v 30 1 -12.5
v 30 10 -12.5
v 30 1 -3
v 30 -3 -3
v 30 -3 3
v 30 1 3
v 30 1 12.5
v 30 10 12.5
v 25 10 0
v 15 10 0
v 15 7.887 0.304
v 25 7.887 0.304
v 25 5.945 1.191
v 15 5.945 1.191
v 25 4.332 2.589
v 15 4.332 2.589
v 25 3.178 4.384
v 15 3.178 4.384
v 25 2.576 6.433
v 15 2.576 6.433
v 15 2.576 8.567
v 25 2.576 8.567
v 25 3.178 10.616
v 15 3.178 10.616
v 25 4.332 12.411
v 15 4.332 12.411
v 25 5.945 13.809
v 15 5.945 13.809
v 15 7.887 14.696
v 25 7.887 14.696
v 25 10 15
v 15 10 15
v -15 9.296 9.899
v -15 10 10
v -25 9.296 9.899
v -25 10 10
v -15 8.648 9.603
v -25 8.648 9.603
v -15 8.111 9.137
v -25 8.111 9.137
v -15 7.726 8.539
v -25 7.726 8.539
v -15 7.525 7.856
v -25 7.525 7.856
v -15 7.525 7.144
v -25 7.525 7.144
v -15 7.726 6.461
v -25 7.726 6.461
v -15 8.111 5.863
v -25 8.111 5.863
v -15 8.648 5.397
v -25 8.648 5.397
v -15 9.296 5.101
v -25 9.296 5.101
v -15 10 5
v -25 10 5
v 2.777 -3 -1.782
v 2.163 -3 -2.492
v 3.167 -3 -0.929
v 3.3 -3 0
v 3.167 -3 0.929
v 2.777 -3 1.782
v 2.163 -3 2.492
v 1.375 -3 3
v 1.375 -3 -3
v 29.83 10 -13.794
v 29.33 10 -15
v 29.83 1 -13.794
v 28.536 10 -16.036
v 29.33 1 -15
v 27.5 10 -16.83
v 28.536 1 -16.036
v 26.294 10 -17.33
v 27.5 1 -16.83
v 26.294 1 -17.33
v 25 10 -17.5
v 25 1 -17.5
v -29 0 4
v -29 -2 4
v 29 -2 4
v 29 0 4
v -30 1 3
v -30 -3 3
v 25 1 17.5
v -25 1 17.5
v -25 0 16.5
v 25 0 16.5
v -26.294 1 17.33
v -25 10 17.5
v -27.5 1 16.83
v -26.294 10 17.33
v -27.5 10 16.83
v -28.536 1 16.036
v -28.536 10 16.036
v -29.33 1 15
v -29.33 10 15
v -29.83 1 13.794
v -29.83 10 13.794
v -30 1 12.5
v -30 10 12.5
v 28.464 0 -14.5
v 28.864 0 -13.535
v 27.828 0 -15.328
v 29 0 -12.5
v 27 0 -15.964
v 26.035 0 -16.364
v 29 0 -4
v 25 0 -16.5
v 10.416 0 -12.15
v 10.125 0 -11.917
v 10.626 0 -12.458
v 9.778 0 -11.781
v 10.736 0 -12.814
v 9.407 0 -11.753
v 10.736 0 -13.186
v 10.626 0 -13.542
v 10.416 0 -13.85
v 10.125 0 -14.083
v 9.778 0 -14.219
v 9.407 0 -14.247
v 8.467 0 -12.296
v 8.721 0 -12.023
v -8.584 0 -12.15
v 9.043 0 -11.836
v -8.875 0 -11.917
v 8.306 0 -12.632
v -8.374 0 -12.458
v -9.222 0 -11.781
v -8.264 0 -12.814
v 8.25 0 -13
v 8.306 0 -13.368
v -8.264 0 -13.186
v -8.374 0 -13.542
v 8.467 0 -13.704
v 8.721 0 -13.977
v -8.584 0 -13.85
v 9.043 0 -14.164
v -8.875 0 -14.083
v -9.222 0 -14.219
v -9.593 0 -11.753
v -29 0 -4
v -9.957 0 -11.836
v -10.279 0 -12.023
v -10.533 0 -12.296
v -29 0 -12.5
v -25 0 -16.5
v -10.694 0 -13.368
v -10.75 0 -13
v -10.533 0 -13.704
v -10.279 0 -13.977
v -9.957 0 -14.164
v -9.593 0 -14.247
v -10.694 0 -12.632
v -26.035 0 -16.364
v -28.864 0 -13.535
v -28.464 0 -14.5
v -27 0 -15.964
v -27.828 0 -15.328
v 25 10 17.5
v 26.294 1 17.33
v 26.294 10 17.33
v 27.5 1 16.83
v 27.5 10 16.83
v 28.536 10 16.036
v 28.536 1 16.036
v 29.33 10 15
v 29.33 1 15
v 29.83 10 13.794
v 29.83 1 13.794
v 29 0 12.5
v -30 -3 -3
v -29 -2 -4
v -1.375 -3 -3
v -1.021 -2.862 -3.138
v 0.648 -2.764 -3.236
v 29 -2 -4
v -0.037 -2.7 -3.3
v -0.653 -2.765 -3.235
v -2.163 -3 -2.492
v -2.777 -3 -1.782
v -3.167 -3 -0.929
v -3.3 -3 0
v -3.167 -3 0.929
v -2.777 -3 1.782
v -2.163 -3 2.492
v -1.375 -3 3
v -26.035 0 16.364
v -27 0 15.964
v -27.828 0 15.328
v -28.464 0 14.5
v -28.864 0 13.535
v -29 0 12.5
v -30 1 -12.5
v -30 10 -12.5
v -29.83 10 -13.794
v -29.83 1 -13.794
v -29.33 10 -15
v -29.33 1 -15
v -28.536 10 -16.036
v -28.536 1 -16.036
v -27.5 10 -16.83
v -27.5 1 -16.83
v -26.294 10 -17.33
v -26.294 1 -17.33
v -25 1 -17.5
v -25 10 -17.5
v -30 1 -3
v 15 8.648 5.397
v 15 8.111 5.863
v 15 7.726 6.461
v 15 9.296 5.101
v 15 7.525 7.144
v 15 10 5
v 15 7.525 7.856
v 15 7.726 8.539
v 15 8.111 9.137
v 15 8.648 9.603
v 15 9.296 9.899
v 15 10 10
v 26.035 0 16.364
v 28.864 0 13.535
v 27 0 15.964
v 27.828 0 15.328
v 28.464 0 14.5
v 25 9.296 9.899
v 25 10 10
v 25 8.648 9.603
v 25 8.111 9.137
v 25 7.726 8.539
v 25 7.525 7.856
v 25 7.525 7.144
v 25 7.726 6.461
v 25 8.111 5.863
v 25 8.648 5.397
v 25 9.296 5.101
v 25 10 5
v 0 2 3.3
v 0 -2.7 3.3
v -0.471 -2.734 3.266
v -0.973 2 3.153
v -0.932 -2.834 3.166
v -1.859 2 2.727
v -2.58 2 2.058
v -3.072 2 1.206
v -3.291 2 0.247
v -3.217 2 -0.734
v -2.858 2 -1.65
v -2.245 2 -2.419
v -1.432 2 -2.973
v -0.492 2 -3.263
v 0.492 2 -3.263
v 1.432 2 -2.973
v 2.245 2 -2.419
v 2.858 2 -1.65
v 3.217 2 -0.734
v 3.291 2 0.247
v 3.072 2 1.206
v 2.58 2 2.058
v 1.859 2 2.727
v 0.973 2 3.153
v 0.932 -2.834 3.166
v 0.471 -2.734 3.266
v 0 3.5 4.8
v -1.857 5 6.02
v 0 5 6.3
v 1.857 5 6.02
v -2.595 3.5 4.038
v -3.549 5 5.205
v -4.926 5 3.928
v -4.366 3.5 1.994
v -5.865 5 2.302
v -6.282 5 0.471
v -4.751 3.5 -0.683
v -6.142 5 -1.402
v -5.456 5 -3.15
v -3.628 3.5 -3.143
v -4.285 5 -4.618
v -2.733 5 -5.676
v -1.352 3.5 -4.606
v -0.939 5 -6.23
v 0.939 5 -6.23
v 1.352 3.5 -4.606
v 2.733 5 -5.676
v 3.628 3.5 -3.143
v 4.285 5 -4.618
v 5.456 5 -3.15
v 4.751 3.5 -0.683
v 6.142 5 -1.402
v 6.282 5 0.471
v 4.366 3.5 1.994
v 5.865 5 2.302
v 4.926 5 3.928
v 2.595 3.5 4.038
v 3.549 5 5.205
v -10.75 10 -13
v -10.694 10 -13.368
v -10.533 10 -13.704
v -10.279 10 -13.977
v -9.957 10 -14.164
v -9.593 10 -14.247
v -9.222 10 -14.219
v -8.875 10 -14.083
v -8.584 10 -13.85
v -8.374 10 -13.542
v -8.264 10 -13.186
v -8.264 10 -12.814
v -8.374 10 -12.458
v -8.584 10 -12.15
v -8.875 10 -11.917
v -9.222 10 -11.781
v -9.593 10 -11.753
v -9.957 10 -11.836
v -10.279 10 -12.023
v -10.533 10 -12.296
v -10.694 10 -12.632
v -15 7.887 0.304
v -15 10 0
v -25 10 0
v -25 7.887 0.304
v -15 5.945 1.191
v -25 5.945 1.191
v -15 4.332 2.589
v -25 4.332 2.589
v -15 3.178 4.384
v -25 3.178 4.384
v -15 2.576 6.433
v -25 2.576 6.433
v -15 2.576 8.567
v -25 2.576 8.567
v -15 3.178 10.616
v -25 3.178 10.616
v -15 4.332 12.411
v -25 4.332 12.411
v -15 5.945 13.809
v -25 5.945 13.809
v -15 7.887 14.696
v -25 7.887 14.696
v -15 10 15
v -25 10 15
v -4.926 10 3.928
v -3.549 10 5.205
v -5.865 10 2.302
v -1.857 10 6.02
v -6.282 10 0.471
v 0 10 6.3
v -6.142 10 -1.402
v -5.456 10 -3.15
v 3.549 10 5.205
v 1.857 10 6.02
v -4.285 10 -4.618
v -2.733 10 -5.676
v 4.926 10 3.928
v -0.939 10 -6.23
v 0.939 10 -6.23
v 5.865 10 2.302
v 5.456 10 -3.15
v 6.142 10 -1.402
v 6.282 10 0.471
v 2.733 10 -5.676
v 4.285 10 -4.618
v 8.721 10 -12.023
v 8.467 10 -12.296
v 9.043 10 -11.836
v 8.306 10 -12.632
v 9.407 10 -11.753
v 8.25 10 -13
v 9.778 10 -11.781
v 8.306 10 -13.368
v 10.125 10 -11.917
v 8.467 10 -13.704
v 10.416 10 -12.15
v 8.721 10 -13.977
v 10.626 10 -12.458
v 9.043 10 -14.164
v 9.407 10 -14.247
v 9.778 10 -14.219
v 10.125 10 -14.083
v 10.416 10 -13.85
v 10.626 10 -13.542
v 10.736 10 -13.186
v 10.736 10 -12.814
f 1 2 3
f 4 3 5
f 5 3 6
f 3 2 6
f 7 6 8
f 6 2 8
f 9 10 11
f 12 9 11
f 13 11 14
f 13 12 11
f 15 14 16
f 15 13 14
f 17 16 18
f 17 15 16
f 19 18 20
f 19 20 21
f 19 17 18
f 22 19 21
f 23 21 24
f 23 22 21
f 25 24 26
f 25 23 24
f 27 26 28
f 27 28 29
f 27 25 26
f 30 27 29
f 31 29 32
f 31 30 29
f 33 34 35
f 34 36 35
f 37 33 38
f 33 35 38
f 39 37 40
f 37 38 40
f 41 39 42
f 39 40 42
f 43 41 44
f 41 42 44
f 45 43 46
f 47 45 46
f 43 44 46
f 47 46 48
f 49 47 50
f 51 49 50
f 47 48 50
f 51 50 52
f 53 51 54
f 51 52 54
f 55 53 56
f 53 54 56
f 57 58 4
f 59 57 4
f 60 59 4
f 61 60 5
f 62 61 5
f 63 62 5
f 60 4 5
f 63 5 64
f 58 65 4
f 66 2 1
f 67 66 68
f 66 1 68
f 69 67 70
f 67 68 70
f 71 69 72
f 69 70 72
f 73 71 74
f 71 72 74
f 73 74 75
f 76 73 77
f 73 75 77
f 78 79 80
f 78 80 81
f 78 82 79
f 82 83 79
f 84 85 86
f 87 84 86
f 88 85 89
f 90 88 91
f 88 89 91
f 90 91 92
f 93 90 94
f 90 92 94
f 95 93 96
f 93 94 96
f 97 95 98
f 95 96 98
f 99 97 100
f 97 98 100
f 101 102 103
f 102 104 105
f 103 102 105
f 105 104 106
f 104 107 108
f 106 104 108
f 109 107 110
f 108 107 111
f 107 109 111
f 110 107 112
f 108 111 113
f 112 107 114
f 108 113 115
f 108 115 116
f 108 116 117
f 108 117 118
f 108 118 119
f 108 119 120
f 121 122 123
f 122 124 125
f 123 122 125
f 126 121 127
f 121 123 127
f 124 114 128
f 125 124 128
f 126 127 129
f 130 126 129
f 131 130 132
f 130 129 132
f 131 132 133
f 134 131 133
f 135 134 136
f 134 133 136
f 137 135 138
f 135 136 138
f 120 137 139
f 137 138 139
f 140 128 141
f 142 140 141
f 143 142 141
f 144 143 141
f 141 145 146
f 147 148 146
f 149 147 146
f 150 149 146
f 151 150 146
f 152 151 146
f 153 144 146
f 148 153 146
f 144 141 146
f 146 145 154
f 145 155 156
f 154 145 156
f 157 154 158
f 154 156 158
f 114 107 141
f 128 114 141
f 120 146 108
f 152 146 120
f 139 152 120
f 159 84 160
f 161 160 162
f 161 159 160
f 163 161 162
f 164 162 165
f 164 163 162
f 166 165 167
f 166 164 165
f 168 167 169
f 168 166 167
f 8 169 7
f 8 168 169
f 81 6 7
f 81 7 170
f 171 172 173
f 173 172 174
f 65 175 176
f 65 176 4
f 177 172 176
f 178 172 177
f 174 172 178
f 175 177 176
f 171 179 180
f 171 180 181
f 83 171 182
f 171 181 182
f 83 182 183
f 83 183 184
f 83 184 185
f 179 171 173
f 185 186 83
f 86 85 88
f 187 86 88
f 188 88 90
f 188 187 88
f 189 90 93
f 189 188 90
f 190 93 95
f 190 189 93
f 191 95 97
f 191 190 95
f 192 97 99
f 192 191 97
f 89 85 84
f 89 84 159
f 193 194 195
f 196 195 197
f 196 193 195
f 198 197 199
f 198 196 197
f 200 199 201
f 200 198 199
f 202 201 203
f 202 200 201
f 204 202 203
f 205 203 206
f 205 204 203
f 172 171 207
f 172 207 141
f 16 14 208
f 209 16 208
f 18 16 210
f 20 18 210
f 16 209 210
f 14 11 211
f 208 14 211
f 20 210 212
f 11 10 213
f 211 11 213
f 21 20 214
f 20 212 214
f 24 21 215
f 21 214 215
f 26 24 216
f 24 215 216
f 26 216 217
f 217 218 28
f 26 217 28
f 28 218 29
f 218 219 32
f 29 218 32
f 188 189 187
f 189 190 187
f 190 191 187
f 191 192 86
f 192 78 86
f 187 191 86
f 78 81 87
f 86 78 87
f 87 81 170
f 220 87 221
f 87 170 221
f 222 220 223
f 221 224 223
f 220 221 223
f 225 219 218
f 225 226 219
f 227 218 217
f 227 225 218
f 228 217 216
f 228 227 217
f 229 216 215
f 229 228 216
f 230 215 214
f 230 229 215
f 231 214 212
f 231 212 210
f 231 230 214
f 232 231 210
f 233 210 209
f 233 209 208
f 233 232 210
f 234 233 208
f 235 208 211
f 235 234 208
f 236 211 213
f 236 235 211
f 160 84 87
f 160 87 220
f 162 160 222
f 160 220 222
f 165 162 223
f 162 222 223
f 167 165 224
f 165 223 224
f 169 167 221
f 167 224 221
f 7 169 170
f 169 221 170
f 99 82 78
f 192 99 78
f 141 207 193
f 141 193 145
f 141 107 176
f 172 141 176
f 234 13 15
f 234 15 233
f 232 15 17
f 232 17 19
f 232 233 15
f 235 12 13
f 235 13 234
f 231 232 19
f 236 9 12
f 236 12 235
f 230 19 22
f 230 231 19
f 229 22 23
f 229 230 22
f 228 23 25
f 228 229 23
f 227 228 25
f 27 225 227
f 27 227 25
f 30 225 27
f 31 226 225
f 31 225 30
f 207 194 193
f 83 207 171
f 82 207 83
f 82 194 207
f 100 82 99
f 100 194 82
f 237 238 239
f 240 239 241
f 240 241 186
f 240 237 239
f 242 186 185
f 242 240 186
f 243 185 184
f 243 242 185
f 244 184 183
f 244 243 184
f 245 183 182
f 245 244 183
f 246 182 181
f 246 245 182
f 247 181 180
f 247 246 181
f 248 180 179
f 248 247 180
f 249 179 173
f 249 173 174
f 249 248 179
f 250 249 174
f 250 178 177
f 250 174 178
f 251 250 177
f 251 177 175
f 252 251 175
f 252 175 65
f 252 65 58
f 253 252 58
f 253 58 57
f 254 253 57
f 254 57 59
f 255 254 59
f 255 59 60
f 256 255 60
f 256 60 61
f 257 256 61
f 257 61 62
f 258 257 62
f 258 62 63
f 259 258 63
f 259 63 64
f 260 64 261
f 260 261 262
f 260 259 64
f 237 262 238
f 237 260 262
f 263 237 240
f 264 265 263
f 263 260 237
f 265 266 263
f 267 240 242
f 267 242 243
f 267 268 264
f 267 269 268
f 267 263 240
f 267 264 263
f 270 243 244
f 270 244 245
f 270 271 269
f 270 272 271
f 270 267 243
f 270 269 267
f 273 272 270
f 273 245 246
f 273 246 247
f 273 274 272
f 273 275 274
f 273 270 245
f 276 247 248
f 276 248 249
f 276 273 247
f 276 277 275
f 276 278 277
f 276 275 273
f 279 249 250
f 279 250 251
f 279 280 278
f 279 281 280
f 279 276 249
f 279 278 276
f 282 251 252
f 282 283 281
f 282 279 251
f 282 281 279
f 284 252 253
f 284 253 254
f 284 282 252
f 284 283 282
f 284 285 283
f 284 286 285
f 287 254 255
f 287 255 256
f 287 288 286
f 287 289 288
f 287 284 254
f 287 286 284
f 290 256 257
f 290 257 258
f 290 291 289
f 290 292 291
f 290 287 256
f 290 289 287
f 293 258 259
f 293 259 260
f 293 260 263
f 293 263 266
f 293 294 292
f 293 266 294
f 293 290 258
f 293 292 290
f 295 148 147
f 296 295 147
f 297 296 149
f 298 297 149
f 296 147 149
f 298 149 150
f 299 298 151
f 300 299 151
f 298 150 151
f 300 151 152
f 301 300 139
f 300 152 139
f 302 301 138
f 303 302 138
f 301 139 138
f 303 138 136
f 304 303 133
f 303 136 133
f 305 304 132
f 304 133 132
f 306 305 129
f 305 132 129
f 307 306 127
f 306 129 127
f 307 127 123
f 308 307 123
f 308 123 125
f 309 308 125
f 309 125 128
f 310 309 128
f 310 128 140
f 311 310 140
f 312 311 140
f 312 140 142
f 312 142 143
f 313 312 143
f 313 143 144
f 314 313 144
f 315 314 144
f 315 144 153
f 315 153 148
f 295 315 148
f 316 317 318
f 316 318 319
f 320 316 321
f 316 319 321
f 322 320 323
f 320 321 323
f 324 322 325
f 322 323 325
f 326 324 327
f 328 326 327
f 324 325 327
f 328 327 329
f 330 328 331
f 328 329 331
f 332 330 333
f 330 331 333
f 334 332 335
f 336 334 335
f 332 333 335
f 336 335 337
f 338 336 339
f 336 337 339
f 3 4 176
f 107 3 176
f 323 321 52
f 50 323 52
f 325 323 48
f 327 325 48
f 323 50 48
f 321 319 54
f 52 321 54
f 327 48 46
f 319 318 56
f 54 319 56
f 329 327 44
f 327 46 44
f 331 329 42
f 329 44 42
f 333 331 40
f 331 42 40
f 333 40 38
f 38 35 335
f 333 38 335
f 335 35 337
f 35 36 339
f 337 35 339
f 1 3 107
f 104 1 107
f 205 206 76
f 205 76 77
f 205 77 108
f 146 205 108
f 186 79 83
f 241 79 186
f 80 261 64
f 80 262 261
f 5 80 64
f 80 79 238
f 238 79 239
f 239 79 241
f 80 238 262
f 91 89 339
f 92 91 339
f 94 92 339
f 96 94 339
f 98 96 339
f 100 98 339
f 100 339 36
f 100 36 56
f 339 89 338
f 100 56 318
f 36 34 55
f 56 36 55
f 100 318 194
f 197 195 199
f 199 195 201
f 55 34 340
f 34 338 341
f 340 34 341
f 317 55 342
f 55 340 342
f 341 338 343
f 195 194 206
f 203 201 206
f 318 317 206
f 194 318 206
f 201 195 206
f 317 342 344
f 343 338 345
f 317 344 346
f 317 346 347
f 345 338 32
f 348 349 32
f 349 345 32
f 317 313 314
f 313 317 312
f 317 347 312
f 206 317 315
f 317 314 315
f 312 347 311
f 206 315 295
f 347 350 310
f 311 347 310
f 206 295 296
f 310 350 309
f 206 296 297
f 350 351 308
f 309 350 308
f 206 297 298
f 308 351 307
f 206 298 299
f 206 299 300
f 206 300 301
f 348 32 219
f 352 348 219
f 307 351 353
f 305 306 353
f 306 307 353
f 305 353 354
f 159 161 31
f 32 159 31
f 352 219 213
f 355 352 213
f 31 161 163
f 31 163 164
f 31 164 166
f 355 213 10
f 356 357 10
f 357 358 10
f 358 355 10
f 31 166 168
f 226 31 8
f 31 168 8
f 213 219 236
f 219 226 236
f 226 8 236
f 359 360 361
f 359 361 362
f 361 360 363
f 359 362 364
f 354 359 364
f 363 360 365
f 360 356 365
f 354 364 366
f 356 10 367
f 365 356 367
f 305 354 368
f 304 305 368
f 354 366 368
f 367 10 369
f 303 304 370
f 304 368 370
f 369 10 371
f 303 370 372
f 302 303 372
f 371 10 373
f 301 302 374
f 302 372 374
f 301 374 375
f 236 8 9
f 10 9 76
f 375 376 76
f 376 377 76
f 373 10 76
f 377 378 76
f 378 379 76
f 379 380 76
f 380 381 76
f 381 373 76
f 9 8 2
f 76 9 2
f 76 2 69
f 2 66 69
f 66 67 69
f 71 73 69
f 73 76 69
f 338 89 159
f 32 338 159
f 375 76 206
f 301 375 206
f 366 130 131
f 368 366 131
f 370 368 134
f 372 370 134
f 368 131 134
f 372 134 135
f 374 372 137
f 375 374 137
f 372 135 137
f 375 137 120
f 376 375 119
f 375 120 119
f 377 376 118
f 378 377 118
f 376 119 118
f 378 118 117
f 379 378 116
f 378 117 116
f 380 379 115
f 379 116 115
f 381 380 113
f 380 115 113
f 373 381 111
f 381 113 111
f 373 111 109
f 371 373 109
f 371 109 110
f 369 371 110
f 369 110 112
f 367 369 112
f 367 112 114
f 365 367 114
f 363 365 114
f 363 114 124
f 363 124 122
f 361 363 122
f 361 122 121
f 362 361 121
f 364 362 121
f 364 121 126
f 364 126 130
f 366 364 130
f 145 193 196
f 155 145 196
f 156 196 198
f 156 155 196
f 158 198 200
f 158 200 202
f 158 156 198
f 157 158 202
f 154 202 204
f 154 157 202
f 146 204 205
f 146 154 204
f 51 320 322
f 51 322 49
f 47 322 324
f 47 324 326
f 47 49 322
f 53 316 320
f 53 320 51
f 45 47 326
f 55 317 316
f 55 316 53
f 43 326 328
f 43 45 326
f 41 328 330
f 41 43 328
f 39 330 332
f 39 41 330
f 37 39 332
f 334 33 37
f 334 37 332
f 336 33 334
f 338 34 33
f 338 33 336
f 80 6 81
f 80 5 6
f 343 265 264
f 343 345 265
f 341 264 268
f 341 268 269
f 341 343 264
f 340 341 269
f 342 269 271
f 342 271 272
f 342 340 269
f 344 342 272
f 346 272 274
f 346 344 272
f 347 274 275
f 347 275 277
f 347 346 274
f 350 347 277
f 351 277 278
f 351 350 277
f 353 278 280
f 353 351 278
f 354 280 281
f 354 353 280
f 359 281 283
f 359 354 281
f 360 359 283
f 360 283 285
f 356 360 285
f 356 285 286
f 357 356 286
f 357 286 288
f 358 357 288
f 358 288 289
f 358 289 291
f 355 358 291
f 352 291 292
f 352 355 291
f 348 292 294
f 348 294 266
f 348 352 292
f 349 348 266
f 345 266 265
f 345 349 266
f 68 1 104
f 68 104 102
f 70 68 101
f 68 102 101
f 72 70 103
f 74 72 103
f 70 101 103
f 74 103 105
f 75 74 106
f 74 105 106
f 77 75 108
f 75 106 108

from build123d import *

# Parameters (mm, degrees)
BOSS_EXTRUDE1_DEPTH   = 30
CUT_EXTRUDE1_DEPTH    = 5
FILLET1_R             = 5
CHAMFER1_SIZE         = 1
M3X0_5_TAPPED_HOLE1_D = 2.5


with BuildPart() as part:
    # Sketch1 → Boss-Extrude1 (new, symmetric)
    with BuildSketch(Plane(origin=(0, 0, 0), x_dir=(0, 0, -1), z_dir=(1, 0, 0))):
        Polygon((-17.5, 10), (17.5, 10), (17.5, 0), (4, 0), (4, -3), (-4, -3), (-4, 0), (-17.5, 0), align=None)
    extrude(amount=BOSS_EXTRUDE1_DEPTH, both=True)

    # Sketch3 → CSK for M6 Flat Head Machine Screw1 (revolve, cut)
    with BuildSketch(Plane(origin=(0, 10, 0), x_dir=(0, 0, 1), z_dir=(1, 0, 0))):
        Polygon((0, 0), (0, 13), (3.3, 13), (3.3, 8), (6.3, 5), (6.3, 0), align=None)
    revolve(axis=Axis((0, 16.35, 0), (0, -1, 0)), mode=Mode.SUBTRACT)

    # Sketch4 → Cut-Extrude1 (cut, symmetric)
    with BuildSketch(Plane(origin=(20, 0, 0), x_dir=(0, 0, -1), z_dir=(1, 0, 0))):
        with BuildLine():
            Line((-15, 10), (-10, 10))
            ThreePointArc((-10, 10), (-7.5, 7.5), (-5, 10))
            Line((-5, 10), (0, 10))
            ThreePointArc((0, 10), (-7.5, 2.5), (-15, 10))
        make_face()
    cut_extrude1 = extrude(amount=CUT_EXTRUDE1_DEPTH, both=True, mode=Mode.SUBTRACT)

    # Mirror1: Cut-Extrude1 across plane
    add(cut_extrude1.mirror(Plane(origin=(0, 0, 0), x_dir=(0, 0, 1), z_dir=(1, 0, 0))), mode=Mode.SUBTRACT)

    # Fillet1
    fillet1_edges = [part.edges().sort_by_distance(p)[0] for p in [
        (-30, 5, 17.5),
        (30, 5, -17.5),
        (30, 5, 17.5),
        (-30, 5, -17.5),
    ]]
    fillet(fillet1_edges, radius=FILLET1_R)

    # Chamfer1
    # the kernel refuses this chamfer: 1 mm, written as the material it takes off along each edge
    with BuildSketch(Plane(origin=(-30, -5.571682988, 4), x_dir=(-0.027495876610585623, 0, -0.9996219169112968), z_dir=(0, 1, 0)), Plane(origin=(-30, 0, -4), x_dir=(-0.027495876610585623, 0, 0.9996219169112968), z_dir=(0, -1, 0))) as chamfer1_piece_1:
        Polygon((CHAMFER1_SIZE * 0.999621916911, -CHAMFER1_SIZE * 0.0274958766106), (-CHAMFER1_SIZE * 0.0274958766106, -CHAMFER1_SIZE * 0.999621916911), (0, 0), align=None)
    extrude(amount=5.571682988, mode=Mode.SUBTRACT)
    with BuildSketch(Plane(origin=(30, -5.571682988, 4), x_dir=(0.027495876610585623, 0, -0.9996219169112968), z_dir=(0, 1, 0)), Plane(origin=(30, 0, -4), x_dir=(0.027495876610585623, 0, 0.9996219169112968), z_dir=(0, -1, 0))) as chamfer1_piece_2:
        Polygon((CHAMFER1_SIZE * 0.999621916911, CHAMFER1_SIZE * 0.0274958766106), (-CHAMFER1_SIZE * 0.0274958766106, CHAMFER1_SIZE * 0.999621916911), (0, 0), align=None)
    extrude(amount=5.571682988, mode=Mode.SUBTRACT)
    with BuildSketch(Plane(origin=(32.571682988, -3, -4), x_dir=(0, 0.9996219169112968, -0.027495876610586494), z_dir=(-1, 0, 0))) as chamfer1_piece_3:
        Polygon((CHAMFER1_SIZE * 0.999621916911, -CHAMFER1_SIZE * 0.0274958766106), (-CHAMFER1_SIZE * 0.0274958766106, -CHAMFER1_SIZE * 0.999621916911), (0, 0), align=None)
    extrude(amount=65.143365976, mode=Mode.SUBTRACT)
    with BuildSketch(Plane(origin=(32.571682988, -3, 4), x_dir=(0, 0.9996219169112968, 0.027495876610586494), z_dir=(-1, 0, 0))) as chamfer1_piece_4:
        Polygon((CHAMFER1_SIZE * 0.999621916911, CHAMFER1_SIZE * 0.0274958766106), (-CHAMFER1_SIZE * 0.0274958766106, CHAMFER1_SIZE * 0.999621916911), (0, 0), align=None)
    extrude(amount=65.143365976, mode=Mode.SUBTRACT)
    with BuildSketch(Plane(origin=(30, 0, -12.5), x_dir=(0.027495876610585623, 0.9996219169112968, 0), z_dir=(0, 0, 1)), Plane(origin=(30, 0, 4), x_dir=(0.02749587661058563, 0.9996219169112968, 0), z_dir=(0, 0, 1))) as chamfer1_piece_5:
        Polygon((CHAMFER1_SIZE * 0.999621916911, CHAMFER1_SIZE * 0.0274958766106), (-CHAMFER1_SIZE * 0.0274958766106, CHAMFER1_SIZE * 0.999621916911), (0, 0), align=None)
    extrude(amount=8.5, mode=Mode.SUBTRACT)
    with BuildSketch(Plane(origin=(-30, 0, 4), x_dir=(-0.02749587661058563, 0.9996219169112968, 0), z_dir=(0, 0, 1)), Plane(origin=(-30, 0, -12.5), x_dir=(-0.027495876610585623, 0.9996219169112968, 0), z_dir=(0, 0, 1))) as chamfer1_piece_6:
        Polygon((CHAMFER1_SIZE * 0.999621916911, -CHAMFER1_SIZE * 0.0274958766106), (-CHAMFER1_SIZE * 0.0274958766106, -CHAMFER1_SIZE * 0.999621916911), (0, 0), align=None)
    extrude(amount=8.5, mode=Mode.SUBTRACT)
    with BuildSketch(Plane(origin=(-25, 0, 17.5), x_dir=(0, 0.9996219169112968, 0.02749587661058563), z_dir=(1, 0, 0)), Plane(origin=(25, 0, -17.5), x_dir=(0, 0.9996219169112968, -0.027495876610585623), z_dir=(-1, 0, 0))) as chamfer1_piece_7:
        Polygon((CHAMFER1_SIZE * 0.999621916911, -CHAMFER1_SIZE * 0.0274958766106), (-CHAMFER1_SIZE * 0.0274958766106, -CHAMFER1_SIZE * 0.999621916911), (0, 0), align=None)
    extrude(amount=50, mode=Mode.SUBTRACT)
    with BuildSketch(Plane(origin=(-25, 0, 12.5), x_dir=(0, 0, 1), z_dir=(1, 0, 0))) as chamfer1_piece_8:
        Polygon((5, -CHAMFER1_SIZE), (5 - CHAMFER1_SIZE, 0), (5, 0), align=None)
    revolve(axis=Axis((-25, 0, 12.5), (0, -1, 0)), revolution_arc=90, mode=Mode.SUBTRACT)
    with BuildSketch(Plane(origin=(25, 0, 12.5), x_dir=(0, 0, 1), z_dir=(-1, 0, 0))) as chamfer1_piece_9:
        Polygon((5, CHAMFER1_SIZE), (5 - CHAMFER1_SIZE, 0), (5, 0), align=None)
    revolve(axis=Axis((25, 0, 12.5), (0, 1, 0)), revolution_arc=90, mode=Mode.SUBTRACT)
    with BuildSketch(Plane(origin=(-25, 0, -12.5), x_dir=(-1, 0, 0), z_dir=(0, 0, 1))) as chamfer1_piece_10:
        Polygon((5, -CHAMFER1_SIZE), (5 - CHAMFER1_SIZE, 0), (5, 0), align=None)
    revolve(axis=Axis((-25, 0, -12.5), (0, -1, 0)), revolution_arc=90, mode=Mode.SUBTRACT)
    with BuildSketch(Plane(origin=(25, 0, -12.5), x_dir=(1, 0, 0), z_dir=(0, 0, 1))) as chamfer1_piece_11:
        Polygon((5, CHAMFER1_SIZE), (5 - CHAMFER1_SIZE, 0), (5, 0), align=None)
    revolve(axis=Axis((25, 0, -12.5), (0, 1, 0)), revolution_arc=90, mode=Mode.SUBTRACT)
    with BuildSketch(Plane(origin=(-30, 0, 1.428317012), x_dir=(-0.02749587661058563, 0.9996219169112968, 0), z_dir=(0, 0, 1))) as chamfer1_piece_12a_section:
        Polygon((CHAMFER1_SIZE * 0.999621916911, -CHAMFER1_SIZE * 0.0274958766106), (-CHAMFER1_SIZE * 0.0274958766106, -CHAMFER1_SIZE * 0.999621916911), (0, 0), align=None)
    chamfer1_piece_12a = extrude(amount=11.071682988, mode=Mode.PRIVATE)
    chamfer1_piece_12a = split(chamfer1_piece_12a, bisect_by=Plane(origin=(-29.670206373, 0.329793627, 4), z_dir=(0, 0, -1)), keep=Keep.TOP, mode=Mode.PRIVATE)
    with BuildSketch(Plane(origin=(-30, -5.571682988, 4), x_dir=(-0.027495876610585623, 0, -0.9996219169112968), z_dir=(0, 1, 0))) as chamfer1_piece_12b_section:
        Polygon((CHAMFER1_SIZE * 0.999621916911, -CHAMFER1_SIZE * 0.0274958766106), (-CHAMFER1_SIZE * 0.0274958766106, -CHAMFER1_SIZE * 0.999621916911), (0, 0), align=None)
    chamfer1_piece_12b = extrude(amount=8.143365976, mode=Mode.PRIVATE)
    chamfer1_piece_12b = split(chamfer1_piece_12b, bisect_by=Plane(origin=(-29.670206373, 0, 3.670206373), z_dir=(0, 1, 0)), keep=Keep.TOP, mode=Mode.PRIVATE)
    chamfer1_piece_12 = chamfer1_piece_12a & chamfer1_piece_12b
    add(chamfer1_piece_12, mode=Mode.SUBTRACT)
    with BuildSketch(Plane(origin=(30, 0, 1.428317012), x_dir=(0.02749587661058563, 0.9996219169112968, 0), z_dir=(0, 0, 1))) as chamfer1_piece_13a_section:
        Polygon((CHAMFER1_SIZE * 0.999621916911, CHAMFER1_SIZE * 0.0274958766106), (-CHAMFER1_SIZE * 0.0274958766106, CHAMFER1_SIZE * 0.999621916911), (0, 0), align=None)
    chamfer1_piece_13a = extrude(amount=11.071682988, mode=Mode.PRIVATE)
    chamfer1_piece_13a = split(chamfer1_piece_13a, bisect_by=Plane(origin=(29.670206373, 0.329793627, 4), z_dir=(0, 0, -1)), keep=Keep.TOP, mode=Mode.PRIVATE)
    with BuildSketch(Plane(origin=(30, -5.571682988, 4), x_dir=(0.027495876610585623, 0, -0.9996219169112968), z_dir=(0, 1, 0))) as chamfer1_piece_13b_section:
        Polygon((CHAMFER1_SIZE * 0.999621916911, CHAMFER1_SIZE * 0.0274958766106), (-CHAMFER1_SIZE * 0.0274958766106, CHAMFER1_SIZE * 0.999621916911), (0, 0), align=None)
    chamfer1_piece_13b = extrude(amount=8.143365976, mode=Mode.PRIVATE)
    chamfer1_piece_13b = split(chamfer1_piece_13b, bisect_by=Plane(origin=(29.670206373, 0, 3.670206373), z_dir=(0, 1, 0)), keep=Keep.TOP, mode=Mode.PRIVATE)
    chamfer1_piece_13 = chamfer1_piece_13a & chamfer1_piece_13b
    add(chamfer1_piece_13, mode=Mode.SUBTRACT)
    with BuildSketch(Plane(origin=(30, 0, -12.5), x_dir=(0.027495876610585623, 0.9996219169112968, 0), z_dir=(0, 0, 1))) as chamfer1_piece_14a_section:
        Polygon((CHAMFER1_SIZE * 0.999621916911, CHAMFER1_SIZE * 0.0274958766106), (-CHAMFER1_SIZE * 0.0274958766106, CHAMFER1_SIZE * 0.999621916911), (0, 0), align=None)
    chamfer1_piece_14a = extrude(amount=11.071682988, mode=Mode.PRIVATE)
    chamfer1_piece_14a = split(chamfer1_piece_14a, bisect_by=Plane(origin=(29.670206373, 0.329793627, -4), z_dir=(0, 0, 1)), keep=Keep.TOP, mode=Mode.PRIVATE)
    with BuildSketch(Plane(origin=(30, 2.571682988, -4), x_dir=(0.027495876610585623, 0, 0.9996219169112968), z_dir=(0, -1, 0))) as chamfer1_piece_14b_section:
        Polygon((CHAMFER1_SIZE * 0.999621916911, CHAMFER1_SIZE * 0.0274958766106), (-CHAMFER1_SIZE * 0.0274958766106, CHAMFER1_SIZE * 0.999621916911), (0, 0), align=None)
    chamfer1_piece_14b = extrude(amount=8.143365976, mode=Mode.PRIVATE)
    chamfer1_piece_14b = split(chamfer1_piece_14b, bisect_by=Plane(origin=(29.670206373, 0, -3.670206373), z_dir=(0, 1, 0)), keep=Keep.TOP, mode=Mode.PRIVATE)
    chamfer1_piece_14 = chamfer1_piece_14a & chamfer1_piece_14b
    add(chamfer1_piece_14, mode=Mode.SUBTRACT)
    with BuildSketch(Plane(origin=(-30, 0, -12.5), x_dir=(-0.027495876610585623, 0.9996219169112968, 0), z_dir=(0, 0, 1))) as chamfer1_piece_15a_section:
        Polygon((CHAMFER1_SIZE * 0.999621916911, -CHAMFER1_SIZE * 0.0274958766106), (-CHAMFER1_SIZE * 0.0274958766106, -CHAMFER1_SIZE * 0.999621916911), (0, 0), align=None)
    chamfer1_piece_15a = extrude(amount=11.071682988, mode=Mode.PRIVATE)
    chamfer1_piece_15a = split(chamfer1_piece_15a, bisect_by=Plane(origin=(-29.670206373, 0.329793627, -4), z_dir=(0, 0, 1)), keep=Keep.TOP, mode=Mode.PRIVATE)
    with BuildSketch(Plane(origin=(-30, 2.571682988, -4), x_dir=(-0.027495876610585623, 0, 0.9996219169112968), z_dir=(0, -1, 0))) as chamfer1_piece_15b_section:
        Polygon((CHAMFER1_SIZE * 0.999621916911, -CHAMFER1_SIZE * 0.0274958766106), (-CHAMFER1_SIZE * 0.0274958766106, -CHAMFER1_SIZE * 0.999621916911), (0, 0), align=None)
    chamfer1_piece_15b = extrude(amount=8.143365976, mode=Mode.PRIVATE)
    chamfer1_piece_15b = split(chamfer1_piece_15b, bisect_by=Plane(origin=(-29.670206373, 0, -3.670206373), z_dir=(0, 1, 0)), keep=Keep.TOP, mode=Mode.PRIVATE)
    chamfer1_piece_15 = chamfer1_piece_15a & chamfer1_piece_15b
    add(chamfer1_piece_15, mode=Mode.SUBTRACT)

    # M3x0.5 Tapped Hole1 (through all)
    with Locations(Plane(origin=(0, 10, 0), x_dir=(1, 0, 0), z_dir=(0, 1, 0))):
        with Locations((-9.5, 13), (9.5, 13)):
            Hole(M3X0_5_TAPPED_HOLE1_D / 2)


solid = part.part
